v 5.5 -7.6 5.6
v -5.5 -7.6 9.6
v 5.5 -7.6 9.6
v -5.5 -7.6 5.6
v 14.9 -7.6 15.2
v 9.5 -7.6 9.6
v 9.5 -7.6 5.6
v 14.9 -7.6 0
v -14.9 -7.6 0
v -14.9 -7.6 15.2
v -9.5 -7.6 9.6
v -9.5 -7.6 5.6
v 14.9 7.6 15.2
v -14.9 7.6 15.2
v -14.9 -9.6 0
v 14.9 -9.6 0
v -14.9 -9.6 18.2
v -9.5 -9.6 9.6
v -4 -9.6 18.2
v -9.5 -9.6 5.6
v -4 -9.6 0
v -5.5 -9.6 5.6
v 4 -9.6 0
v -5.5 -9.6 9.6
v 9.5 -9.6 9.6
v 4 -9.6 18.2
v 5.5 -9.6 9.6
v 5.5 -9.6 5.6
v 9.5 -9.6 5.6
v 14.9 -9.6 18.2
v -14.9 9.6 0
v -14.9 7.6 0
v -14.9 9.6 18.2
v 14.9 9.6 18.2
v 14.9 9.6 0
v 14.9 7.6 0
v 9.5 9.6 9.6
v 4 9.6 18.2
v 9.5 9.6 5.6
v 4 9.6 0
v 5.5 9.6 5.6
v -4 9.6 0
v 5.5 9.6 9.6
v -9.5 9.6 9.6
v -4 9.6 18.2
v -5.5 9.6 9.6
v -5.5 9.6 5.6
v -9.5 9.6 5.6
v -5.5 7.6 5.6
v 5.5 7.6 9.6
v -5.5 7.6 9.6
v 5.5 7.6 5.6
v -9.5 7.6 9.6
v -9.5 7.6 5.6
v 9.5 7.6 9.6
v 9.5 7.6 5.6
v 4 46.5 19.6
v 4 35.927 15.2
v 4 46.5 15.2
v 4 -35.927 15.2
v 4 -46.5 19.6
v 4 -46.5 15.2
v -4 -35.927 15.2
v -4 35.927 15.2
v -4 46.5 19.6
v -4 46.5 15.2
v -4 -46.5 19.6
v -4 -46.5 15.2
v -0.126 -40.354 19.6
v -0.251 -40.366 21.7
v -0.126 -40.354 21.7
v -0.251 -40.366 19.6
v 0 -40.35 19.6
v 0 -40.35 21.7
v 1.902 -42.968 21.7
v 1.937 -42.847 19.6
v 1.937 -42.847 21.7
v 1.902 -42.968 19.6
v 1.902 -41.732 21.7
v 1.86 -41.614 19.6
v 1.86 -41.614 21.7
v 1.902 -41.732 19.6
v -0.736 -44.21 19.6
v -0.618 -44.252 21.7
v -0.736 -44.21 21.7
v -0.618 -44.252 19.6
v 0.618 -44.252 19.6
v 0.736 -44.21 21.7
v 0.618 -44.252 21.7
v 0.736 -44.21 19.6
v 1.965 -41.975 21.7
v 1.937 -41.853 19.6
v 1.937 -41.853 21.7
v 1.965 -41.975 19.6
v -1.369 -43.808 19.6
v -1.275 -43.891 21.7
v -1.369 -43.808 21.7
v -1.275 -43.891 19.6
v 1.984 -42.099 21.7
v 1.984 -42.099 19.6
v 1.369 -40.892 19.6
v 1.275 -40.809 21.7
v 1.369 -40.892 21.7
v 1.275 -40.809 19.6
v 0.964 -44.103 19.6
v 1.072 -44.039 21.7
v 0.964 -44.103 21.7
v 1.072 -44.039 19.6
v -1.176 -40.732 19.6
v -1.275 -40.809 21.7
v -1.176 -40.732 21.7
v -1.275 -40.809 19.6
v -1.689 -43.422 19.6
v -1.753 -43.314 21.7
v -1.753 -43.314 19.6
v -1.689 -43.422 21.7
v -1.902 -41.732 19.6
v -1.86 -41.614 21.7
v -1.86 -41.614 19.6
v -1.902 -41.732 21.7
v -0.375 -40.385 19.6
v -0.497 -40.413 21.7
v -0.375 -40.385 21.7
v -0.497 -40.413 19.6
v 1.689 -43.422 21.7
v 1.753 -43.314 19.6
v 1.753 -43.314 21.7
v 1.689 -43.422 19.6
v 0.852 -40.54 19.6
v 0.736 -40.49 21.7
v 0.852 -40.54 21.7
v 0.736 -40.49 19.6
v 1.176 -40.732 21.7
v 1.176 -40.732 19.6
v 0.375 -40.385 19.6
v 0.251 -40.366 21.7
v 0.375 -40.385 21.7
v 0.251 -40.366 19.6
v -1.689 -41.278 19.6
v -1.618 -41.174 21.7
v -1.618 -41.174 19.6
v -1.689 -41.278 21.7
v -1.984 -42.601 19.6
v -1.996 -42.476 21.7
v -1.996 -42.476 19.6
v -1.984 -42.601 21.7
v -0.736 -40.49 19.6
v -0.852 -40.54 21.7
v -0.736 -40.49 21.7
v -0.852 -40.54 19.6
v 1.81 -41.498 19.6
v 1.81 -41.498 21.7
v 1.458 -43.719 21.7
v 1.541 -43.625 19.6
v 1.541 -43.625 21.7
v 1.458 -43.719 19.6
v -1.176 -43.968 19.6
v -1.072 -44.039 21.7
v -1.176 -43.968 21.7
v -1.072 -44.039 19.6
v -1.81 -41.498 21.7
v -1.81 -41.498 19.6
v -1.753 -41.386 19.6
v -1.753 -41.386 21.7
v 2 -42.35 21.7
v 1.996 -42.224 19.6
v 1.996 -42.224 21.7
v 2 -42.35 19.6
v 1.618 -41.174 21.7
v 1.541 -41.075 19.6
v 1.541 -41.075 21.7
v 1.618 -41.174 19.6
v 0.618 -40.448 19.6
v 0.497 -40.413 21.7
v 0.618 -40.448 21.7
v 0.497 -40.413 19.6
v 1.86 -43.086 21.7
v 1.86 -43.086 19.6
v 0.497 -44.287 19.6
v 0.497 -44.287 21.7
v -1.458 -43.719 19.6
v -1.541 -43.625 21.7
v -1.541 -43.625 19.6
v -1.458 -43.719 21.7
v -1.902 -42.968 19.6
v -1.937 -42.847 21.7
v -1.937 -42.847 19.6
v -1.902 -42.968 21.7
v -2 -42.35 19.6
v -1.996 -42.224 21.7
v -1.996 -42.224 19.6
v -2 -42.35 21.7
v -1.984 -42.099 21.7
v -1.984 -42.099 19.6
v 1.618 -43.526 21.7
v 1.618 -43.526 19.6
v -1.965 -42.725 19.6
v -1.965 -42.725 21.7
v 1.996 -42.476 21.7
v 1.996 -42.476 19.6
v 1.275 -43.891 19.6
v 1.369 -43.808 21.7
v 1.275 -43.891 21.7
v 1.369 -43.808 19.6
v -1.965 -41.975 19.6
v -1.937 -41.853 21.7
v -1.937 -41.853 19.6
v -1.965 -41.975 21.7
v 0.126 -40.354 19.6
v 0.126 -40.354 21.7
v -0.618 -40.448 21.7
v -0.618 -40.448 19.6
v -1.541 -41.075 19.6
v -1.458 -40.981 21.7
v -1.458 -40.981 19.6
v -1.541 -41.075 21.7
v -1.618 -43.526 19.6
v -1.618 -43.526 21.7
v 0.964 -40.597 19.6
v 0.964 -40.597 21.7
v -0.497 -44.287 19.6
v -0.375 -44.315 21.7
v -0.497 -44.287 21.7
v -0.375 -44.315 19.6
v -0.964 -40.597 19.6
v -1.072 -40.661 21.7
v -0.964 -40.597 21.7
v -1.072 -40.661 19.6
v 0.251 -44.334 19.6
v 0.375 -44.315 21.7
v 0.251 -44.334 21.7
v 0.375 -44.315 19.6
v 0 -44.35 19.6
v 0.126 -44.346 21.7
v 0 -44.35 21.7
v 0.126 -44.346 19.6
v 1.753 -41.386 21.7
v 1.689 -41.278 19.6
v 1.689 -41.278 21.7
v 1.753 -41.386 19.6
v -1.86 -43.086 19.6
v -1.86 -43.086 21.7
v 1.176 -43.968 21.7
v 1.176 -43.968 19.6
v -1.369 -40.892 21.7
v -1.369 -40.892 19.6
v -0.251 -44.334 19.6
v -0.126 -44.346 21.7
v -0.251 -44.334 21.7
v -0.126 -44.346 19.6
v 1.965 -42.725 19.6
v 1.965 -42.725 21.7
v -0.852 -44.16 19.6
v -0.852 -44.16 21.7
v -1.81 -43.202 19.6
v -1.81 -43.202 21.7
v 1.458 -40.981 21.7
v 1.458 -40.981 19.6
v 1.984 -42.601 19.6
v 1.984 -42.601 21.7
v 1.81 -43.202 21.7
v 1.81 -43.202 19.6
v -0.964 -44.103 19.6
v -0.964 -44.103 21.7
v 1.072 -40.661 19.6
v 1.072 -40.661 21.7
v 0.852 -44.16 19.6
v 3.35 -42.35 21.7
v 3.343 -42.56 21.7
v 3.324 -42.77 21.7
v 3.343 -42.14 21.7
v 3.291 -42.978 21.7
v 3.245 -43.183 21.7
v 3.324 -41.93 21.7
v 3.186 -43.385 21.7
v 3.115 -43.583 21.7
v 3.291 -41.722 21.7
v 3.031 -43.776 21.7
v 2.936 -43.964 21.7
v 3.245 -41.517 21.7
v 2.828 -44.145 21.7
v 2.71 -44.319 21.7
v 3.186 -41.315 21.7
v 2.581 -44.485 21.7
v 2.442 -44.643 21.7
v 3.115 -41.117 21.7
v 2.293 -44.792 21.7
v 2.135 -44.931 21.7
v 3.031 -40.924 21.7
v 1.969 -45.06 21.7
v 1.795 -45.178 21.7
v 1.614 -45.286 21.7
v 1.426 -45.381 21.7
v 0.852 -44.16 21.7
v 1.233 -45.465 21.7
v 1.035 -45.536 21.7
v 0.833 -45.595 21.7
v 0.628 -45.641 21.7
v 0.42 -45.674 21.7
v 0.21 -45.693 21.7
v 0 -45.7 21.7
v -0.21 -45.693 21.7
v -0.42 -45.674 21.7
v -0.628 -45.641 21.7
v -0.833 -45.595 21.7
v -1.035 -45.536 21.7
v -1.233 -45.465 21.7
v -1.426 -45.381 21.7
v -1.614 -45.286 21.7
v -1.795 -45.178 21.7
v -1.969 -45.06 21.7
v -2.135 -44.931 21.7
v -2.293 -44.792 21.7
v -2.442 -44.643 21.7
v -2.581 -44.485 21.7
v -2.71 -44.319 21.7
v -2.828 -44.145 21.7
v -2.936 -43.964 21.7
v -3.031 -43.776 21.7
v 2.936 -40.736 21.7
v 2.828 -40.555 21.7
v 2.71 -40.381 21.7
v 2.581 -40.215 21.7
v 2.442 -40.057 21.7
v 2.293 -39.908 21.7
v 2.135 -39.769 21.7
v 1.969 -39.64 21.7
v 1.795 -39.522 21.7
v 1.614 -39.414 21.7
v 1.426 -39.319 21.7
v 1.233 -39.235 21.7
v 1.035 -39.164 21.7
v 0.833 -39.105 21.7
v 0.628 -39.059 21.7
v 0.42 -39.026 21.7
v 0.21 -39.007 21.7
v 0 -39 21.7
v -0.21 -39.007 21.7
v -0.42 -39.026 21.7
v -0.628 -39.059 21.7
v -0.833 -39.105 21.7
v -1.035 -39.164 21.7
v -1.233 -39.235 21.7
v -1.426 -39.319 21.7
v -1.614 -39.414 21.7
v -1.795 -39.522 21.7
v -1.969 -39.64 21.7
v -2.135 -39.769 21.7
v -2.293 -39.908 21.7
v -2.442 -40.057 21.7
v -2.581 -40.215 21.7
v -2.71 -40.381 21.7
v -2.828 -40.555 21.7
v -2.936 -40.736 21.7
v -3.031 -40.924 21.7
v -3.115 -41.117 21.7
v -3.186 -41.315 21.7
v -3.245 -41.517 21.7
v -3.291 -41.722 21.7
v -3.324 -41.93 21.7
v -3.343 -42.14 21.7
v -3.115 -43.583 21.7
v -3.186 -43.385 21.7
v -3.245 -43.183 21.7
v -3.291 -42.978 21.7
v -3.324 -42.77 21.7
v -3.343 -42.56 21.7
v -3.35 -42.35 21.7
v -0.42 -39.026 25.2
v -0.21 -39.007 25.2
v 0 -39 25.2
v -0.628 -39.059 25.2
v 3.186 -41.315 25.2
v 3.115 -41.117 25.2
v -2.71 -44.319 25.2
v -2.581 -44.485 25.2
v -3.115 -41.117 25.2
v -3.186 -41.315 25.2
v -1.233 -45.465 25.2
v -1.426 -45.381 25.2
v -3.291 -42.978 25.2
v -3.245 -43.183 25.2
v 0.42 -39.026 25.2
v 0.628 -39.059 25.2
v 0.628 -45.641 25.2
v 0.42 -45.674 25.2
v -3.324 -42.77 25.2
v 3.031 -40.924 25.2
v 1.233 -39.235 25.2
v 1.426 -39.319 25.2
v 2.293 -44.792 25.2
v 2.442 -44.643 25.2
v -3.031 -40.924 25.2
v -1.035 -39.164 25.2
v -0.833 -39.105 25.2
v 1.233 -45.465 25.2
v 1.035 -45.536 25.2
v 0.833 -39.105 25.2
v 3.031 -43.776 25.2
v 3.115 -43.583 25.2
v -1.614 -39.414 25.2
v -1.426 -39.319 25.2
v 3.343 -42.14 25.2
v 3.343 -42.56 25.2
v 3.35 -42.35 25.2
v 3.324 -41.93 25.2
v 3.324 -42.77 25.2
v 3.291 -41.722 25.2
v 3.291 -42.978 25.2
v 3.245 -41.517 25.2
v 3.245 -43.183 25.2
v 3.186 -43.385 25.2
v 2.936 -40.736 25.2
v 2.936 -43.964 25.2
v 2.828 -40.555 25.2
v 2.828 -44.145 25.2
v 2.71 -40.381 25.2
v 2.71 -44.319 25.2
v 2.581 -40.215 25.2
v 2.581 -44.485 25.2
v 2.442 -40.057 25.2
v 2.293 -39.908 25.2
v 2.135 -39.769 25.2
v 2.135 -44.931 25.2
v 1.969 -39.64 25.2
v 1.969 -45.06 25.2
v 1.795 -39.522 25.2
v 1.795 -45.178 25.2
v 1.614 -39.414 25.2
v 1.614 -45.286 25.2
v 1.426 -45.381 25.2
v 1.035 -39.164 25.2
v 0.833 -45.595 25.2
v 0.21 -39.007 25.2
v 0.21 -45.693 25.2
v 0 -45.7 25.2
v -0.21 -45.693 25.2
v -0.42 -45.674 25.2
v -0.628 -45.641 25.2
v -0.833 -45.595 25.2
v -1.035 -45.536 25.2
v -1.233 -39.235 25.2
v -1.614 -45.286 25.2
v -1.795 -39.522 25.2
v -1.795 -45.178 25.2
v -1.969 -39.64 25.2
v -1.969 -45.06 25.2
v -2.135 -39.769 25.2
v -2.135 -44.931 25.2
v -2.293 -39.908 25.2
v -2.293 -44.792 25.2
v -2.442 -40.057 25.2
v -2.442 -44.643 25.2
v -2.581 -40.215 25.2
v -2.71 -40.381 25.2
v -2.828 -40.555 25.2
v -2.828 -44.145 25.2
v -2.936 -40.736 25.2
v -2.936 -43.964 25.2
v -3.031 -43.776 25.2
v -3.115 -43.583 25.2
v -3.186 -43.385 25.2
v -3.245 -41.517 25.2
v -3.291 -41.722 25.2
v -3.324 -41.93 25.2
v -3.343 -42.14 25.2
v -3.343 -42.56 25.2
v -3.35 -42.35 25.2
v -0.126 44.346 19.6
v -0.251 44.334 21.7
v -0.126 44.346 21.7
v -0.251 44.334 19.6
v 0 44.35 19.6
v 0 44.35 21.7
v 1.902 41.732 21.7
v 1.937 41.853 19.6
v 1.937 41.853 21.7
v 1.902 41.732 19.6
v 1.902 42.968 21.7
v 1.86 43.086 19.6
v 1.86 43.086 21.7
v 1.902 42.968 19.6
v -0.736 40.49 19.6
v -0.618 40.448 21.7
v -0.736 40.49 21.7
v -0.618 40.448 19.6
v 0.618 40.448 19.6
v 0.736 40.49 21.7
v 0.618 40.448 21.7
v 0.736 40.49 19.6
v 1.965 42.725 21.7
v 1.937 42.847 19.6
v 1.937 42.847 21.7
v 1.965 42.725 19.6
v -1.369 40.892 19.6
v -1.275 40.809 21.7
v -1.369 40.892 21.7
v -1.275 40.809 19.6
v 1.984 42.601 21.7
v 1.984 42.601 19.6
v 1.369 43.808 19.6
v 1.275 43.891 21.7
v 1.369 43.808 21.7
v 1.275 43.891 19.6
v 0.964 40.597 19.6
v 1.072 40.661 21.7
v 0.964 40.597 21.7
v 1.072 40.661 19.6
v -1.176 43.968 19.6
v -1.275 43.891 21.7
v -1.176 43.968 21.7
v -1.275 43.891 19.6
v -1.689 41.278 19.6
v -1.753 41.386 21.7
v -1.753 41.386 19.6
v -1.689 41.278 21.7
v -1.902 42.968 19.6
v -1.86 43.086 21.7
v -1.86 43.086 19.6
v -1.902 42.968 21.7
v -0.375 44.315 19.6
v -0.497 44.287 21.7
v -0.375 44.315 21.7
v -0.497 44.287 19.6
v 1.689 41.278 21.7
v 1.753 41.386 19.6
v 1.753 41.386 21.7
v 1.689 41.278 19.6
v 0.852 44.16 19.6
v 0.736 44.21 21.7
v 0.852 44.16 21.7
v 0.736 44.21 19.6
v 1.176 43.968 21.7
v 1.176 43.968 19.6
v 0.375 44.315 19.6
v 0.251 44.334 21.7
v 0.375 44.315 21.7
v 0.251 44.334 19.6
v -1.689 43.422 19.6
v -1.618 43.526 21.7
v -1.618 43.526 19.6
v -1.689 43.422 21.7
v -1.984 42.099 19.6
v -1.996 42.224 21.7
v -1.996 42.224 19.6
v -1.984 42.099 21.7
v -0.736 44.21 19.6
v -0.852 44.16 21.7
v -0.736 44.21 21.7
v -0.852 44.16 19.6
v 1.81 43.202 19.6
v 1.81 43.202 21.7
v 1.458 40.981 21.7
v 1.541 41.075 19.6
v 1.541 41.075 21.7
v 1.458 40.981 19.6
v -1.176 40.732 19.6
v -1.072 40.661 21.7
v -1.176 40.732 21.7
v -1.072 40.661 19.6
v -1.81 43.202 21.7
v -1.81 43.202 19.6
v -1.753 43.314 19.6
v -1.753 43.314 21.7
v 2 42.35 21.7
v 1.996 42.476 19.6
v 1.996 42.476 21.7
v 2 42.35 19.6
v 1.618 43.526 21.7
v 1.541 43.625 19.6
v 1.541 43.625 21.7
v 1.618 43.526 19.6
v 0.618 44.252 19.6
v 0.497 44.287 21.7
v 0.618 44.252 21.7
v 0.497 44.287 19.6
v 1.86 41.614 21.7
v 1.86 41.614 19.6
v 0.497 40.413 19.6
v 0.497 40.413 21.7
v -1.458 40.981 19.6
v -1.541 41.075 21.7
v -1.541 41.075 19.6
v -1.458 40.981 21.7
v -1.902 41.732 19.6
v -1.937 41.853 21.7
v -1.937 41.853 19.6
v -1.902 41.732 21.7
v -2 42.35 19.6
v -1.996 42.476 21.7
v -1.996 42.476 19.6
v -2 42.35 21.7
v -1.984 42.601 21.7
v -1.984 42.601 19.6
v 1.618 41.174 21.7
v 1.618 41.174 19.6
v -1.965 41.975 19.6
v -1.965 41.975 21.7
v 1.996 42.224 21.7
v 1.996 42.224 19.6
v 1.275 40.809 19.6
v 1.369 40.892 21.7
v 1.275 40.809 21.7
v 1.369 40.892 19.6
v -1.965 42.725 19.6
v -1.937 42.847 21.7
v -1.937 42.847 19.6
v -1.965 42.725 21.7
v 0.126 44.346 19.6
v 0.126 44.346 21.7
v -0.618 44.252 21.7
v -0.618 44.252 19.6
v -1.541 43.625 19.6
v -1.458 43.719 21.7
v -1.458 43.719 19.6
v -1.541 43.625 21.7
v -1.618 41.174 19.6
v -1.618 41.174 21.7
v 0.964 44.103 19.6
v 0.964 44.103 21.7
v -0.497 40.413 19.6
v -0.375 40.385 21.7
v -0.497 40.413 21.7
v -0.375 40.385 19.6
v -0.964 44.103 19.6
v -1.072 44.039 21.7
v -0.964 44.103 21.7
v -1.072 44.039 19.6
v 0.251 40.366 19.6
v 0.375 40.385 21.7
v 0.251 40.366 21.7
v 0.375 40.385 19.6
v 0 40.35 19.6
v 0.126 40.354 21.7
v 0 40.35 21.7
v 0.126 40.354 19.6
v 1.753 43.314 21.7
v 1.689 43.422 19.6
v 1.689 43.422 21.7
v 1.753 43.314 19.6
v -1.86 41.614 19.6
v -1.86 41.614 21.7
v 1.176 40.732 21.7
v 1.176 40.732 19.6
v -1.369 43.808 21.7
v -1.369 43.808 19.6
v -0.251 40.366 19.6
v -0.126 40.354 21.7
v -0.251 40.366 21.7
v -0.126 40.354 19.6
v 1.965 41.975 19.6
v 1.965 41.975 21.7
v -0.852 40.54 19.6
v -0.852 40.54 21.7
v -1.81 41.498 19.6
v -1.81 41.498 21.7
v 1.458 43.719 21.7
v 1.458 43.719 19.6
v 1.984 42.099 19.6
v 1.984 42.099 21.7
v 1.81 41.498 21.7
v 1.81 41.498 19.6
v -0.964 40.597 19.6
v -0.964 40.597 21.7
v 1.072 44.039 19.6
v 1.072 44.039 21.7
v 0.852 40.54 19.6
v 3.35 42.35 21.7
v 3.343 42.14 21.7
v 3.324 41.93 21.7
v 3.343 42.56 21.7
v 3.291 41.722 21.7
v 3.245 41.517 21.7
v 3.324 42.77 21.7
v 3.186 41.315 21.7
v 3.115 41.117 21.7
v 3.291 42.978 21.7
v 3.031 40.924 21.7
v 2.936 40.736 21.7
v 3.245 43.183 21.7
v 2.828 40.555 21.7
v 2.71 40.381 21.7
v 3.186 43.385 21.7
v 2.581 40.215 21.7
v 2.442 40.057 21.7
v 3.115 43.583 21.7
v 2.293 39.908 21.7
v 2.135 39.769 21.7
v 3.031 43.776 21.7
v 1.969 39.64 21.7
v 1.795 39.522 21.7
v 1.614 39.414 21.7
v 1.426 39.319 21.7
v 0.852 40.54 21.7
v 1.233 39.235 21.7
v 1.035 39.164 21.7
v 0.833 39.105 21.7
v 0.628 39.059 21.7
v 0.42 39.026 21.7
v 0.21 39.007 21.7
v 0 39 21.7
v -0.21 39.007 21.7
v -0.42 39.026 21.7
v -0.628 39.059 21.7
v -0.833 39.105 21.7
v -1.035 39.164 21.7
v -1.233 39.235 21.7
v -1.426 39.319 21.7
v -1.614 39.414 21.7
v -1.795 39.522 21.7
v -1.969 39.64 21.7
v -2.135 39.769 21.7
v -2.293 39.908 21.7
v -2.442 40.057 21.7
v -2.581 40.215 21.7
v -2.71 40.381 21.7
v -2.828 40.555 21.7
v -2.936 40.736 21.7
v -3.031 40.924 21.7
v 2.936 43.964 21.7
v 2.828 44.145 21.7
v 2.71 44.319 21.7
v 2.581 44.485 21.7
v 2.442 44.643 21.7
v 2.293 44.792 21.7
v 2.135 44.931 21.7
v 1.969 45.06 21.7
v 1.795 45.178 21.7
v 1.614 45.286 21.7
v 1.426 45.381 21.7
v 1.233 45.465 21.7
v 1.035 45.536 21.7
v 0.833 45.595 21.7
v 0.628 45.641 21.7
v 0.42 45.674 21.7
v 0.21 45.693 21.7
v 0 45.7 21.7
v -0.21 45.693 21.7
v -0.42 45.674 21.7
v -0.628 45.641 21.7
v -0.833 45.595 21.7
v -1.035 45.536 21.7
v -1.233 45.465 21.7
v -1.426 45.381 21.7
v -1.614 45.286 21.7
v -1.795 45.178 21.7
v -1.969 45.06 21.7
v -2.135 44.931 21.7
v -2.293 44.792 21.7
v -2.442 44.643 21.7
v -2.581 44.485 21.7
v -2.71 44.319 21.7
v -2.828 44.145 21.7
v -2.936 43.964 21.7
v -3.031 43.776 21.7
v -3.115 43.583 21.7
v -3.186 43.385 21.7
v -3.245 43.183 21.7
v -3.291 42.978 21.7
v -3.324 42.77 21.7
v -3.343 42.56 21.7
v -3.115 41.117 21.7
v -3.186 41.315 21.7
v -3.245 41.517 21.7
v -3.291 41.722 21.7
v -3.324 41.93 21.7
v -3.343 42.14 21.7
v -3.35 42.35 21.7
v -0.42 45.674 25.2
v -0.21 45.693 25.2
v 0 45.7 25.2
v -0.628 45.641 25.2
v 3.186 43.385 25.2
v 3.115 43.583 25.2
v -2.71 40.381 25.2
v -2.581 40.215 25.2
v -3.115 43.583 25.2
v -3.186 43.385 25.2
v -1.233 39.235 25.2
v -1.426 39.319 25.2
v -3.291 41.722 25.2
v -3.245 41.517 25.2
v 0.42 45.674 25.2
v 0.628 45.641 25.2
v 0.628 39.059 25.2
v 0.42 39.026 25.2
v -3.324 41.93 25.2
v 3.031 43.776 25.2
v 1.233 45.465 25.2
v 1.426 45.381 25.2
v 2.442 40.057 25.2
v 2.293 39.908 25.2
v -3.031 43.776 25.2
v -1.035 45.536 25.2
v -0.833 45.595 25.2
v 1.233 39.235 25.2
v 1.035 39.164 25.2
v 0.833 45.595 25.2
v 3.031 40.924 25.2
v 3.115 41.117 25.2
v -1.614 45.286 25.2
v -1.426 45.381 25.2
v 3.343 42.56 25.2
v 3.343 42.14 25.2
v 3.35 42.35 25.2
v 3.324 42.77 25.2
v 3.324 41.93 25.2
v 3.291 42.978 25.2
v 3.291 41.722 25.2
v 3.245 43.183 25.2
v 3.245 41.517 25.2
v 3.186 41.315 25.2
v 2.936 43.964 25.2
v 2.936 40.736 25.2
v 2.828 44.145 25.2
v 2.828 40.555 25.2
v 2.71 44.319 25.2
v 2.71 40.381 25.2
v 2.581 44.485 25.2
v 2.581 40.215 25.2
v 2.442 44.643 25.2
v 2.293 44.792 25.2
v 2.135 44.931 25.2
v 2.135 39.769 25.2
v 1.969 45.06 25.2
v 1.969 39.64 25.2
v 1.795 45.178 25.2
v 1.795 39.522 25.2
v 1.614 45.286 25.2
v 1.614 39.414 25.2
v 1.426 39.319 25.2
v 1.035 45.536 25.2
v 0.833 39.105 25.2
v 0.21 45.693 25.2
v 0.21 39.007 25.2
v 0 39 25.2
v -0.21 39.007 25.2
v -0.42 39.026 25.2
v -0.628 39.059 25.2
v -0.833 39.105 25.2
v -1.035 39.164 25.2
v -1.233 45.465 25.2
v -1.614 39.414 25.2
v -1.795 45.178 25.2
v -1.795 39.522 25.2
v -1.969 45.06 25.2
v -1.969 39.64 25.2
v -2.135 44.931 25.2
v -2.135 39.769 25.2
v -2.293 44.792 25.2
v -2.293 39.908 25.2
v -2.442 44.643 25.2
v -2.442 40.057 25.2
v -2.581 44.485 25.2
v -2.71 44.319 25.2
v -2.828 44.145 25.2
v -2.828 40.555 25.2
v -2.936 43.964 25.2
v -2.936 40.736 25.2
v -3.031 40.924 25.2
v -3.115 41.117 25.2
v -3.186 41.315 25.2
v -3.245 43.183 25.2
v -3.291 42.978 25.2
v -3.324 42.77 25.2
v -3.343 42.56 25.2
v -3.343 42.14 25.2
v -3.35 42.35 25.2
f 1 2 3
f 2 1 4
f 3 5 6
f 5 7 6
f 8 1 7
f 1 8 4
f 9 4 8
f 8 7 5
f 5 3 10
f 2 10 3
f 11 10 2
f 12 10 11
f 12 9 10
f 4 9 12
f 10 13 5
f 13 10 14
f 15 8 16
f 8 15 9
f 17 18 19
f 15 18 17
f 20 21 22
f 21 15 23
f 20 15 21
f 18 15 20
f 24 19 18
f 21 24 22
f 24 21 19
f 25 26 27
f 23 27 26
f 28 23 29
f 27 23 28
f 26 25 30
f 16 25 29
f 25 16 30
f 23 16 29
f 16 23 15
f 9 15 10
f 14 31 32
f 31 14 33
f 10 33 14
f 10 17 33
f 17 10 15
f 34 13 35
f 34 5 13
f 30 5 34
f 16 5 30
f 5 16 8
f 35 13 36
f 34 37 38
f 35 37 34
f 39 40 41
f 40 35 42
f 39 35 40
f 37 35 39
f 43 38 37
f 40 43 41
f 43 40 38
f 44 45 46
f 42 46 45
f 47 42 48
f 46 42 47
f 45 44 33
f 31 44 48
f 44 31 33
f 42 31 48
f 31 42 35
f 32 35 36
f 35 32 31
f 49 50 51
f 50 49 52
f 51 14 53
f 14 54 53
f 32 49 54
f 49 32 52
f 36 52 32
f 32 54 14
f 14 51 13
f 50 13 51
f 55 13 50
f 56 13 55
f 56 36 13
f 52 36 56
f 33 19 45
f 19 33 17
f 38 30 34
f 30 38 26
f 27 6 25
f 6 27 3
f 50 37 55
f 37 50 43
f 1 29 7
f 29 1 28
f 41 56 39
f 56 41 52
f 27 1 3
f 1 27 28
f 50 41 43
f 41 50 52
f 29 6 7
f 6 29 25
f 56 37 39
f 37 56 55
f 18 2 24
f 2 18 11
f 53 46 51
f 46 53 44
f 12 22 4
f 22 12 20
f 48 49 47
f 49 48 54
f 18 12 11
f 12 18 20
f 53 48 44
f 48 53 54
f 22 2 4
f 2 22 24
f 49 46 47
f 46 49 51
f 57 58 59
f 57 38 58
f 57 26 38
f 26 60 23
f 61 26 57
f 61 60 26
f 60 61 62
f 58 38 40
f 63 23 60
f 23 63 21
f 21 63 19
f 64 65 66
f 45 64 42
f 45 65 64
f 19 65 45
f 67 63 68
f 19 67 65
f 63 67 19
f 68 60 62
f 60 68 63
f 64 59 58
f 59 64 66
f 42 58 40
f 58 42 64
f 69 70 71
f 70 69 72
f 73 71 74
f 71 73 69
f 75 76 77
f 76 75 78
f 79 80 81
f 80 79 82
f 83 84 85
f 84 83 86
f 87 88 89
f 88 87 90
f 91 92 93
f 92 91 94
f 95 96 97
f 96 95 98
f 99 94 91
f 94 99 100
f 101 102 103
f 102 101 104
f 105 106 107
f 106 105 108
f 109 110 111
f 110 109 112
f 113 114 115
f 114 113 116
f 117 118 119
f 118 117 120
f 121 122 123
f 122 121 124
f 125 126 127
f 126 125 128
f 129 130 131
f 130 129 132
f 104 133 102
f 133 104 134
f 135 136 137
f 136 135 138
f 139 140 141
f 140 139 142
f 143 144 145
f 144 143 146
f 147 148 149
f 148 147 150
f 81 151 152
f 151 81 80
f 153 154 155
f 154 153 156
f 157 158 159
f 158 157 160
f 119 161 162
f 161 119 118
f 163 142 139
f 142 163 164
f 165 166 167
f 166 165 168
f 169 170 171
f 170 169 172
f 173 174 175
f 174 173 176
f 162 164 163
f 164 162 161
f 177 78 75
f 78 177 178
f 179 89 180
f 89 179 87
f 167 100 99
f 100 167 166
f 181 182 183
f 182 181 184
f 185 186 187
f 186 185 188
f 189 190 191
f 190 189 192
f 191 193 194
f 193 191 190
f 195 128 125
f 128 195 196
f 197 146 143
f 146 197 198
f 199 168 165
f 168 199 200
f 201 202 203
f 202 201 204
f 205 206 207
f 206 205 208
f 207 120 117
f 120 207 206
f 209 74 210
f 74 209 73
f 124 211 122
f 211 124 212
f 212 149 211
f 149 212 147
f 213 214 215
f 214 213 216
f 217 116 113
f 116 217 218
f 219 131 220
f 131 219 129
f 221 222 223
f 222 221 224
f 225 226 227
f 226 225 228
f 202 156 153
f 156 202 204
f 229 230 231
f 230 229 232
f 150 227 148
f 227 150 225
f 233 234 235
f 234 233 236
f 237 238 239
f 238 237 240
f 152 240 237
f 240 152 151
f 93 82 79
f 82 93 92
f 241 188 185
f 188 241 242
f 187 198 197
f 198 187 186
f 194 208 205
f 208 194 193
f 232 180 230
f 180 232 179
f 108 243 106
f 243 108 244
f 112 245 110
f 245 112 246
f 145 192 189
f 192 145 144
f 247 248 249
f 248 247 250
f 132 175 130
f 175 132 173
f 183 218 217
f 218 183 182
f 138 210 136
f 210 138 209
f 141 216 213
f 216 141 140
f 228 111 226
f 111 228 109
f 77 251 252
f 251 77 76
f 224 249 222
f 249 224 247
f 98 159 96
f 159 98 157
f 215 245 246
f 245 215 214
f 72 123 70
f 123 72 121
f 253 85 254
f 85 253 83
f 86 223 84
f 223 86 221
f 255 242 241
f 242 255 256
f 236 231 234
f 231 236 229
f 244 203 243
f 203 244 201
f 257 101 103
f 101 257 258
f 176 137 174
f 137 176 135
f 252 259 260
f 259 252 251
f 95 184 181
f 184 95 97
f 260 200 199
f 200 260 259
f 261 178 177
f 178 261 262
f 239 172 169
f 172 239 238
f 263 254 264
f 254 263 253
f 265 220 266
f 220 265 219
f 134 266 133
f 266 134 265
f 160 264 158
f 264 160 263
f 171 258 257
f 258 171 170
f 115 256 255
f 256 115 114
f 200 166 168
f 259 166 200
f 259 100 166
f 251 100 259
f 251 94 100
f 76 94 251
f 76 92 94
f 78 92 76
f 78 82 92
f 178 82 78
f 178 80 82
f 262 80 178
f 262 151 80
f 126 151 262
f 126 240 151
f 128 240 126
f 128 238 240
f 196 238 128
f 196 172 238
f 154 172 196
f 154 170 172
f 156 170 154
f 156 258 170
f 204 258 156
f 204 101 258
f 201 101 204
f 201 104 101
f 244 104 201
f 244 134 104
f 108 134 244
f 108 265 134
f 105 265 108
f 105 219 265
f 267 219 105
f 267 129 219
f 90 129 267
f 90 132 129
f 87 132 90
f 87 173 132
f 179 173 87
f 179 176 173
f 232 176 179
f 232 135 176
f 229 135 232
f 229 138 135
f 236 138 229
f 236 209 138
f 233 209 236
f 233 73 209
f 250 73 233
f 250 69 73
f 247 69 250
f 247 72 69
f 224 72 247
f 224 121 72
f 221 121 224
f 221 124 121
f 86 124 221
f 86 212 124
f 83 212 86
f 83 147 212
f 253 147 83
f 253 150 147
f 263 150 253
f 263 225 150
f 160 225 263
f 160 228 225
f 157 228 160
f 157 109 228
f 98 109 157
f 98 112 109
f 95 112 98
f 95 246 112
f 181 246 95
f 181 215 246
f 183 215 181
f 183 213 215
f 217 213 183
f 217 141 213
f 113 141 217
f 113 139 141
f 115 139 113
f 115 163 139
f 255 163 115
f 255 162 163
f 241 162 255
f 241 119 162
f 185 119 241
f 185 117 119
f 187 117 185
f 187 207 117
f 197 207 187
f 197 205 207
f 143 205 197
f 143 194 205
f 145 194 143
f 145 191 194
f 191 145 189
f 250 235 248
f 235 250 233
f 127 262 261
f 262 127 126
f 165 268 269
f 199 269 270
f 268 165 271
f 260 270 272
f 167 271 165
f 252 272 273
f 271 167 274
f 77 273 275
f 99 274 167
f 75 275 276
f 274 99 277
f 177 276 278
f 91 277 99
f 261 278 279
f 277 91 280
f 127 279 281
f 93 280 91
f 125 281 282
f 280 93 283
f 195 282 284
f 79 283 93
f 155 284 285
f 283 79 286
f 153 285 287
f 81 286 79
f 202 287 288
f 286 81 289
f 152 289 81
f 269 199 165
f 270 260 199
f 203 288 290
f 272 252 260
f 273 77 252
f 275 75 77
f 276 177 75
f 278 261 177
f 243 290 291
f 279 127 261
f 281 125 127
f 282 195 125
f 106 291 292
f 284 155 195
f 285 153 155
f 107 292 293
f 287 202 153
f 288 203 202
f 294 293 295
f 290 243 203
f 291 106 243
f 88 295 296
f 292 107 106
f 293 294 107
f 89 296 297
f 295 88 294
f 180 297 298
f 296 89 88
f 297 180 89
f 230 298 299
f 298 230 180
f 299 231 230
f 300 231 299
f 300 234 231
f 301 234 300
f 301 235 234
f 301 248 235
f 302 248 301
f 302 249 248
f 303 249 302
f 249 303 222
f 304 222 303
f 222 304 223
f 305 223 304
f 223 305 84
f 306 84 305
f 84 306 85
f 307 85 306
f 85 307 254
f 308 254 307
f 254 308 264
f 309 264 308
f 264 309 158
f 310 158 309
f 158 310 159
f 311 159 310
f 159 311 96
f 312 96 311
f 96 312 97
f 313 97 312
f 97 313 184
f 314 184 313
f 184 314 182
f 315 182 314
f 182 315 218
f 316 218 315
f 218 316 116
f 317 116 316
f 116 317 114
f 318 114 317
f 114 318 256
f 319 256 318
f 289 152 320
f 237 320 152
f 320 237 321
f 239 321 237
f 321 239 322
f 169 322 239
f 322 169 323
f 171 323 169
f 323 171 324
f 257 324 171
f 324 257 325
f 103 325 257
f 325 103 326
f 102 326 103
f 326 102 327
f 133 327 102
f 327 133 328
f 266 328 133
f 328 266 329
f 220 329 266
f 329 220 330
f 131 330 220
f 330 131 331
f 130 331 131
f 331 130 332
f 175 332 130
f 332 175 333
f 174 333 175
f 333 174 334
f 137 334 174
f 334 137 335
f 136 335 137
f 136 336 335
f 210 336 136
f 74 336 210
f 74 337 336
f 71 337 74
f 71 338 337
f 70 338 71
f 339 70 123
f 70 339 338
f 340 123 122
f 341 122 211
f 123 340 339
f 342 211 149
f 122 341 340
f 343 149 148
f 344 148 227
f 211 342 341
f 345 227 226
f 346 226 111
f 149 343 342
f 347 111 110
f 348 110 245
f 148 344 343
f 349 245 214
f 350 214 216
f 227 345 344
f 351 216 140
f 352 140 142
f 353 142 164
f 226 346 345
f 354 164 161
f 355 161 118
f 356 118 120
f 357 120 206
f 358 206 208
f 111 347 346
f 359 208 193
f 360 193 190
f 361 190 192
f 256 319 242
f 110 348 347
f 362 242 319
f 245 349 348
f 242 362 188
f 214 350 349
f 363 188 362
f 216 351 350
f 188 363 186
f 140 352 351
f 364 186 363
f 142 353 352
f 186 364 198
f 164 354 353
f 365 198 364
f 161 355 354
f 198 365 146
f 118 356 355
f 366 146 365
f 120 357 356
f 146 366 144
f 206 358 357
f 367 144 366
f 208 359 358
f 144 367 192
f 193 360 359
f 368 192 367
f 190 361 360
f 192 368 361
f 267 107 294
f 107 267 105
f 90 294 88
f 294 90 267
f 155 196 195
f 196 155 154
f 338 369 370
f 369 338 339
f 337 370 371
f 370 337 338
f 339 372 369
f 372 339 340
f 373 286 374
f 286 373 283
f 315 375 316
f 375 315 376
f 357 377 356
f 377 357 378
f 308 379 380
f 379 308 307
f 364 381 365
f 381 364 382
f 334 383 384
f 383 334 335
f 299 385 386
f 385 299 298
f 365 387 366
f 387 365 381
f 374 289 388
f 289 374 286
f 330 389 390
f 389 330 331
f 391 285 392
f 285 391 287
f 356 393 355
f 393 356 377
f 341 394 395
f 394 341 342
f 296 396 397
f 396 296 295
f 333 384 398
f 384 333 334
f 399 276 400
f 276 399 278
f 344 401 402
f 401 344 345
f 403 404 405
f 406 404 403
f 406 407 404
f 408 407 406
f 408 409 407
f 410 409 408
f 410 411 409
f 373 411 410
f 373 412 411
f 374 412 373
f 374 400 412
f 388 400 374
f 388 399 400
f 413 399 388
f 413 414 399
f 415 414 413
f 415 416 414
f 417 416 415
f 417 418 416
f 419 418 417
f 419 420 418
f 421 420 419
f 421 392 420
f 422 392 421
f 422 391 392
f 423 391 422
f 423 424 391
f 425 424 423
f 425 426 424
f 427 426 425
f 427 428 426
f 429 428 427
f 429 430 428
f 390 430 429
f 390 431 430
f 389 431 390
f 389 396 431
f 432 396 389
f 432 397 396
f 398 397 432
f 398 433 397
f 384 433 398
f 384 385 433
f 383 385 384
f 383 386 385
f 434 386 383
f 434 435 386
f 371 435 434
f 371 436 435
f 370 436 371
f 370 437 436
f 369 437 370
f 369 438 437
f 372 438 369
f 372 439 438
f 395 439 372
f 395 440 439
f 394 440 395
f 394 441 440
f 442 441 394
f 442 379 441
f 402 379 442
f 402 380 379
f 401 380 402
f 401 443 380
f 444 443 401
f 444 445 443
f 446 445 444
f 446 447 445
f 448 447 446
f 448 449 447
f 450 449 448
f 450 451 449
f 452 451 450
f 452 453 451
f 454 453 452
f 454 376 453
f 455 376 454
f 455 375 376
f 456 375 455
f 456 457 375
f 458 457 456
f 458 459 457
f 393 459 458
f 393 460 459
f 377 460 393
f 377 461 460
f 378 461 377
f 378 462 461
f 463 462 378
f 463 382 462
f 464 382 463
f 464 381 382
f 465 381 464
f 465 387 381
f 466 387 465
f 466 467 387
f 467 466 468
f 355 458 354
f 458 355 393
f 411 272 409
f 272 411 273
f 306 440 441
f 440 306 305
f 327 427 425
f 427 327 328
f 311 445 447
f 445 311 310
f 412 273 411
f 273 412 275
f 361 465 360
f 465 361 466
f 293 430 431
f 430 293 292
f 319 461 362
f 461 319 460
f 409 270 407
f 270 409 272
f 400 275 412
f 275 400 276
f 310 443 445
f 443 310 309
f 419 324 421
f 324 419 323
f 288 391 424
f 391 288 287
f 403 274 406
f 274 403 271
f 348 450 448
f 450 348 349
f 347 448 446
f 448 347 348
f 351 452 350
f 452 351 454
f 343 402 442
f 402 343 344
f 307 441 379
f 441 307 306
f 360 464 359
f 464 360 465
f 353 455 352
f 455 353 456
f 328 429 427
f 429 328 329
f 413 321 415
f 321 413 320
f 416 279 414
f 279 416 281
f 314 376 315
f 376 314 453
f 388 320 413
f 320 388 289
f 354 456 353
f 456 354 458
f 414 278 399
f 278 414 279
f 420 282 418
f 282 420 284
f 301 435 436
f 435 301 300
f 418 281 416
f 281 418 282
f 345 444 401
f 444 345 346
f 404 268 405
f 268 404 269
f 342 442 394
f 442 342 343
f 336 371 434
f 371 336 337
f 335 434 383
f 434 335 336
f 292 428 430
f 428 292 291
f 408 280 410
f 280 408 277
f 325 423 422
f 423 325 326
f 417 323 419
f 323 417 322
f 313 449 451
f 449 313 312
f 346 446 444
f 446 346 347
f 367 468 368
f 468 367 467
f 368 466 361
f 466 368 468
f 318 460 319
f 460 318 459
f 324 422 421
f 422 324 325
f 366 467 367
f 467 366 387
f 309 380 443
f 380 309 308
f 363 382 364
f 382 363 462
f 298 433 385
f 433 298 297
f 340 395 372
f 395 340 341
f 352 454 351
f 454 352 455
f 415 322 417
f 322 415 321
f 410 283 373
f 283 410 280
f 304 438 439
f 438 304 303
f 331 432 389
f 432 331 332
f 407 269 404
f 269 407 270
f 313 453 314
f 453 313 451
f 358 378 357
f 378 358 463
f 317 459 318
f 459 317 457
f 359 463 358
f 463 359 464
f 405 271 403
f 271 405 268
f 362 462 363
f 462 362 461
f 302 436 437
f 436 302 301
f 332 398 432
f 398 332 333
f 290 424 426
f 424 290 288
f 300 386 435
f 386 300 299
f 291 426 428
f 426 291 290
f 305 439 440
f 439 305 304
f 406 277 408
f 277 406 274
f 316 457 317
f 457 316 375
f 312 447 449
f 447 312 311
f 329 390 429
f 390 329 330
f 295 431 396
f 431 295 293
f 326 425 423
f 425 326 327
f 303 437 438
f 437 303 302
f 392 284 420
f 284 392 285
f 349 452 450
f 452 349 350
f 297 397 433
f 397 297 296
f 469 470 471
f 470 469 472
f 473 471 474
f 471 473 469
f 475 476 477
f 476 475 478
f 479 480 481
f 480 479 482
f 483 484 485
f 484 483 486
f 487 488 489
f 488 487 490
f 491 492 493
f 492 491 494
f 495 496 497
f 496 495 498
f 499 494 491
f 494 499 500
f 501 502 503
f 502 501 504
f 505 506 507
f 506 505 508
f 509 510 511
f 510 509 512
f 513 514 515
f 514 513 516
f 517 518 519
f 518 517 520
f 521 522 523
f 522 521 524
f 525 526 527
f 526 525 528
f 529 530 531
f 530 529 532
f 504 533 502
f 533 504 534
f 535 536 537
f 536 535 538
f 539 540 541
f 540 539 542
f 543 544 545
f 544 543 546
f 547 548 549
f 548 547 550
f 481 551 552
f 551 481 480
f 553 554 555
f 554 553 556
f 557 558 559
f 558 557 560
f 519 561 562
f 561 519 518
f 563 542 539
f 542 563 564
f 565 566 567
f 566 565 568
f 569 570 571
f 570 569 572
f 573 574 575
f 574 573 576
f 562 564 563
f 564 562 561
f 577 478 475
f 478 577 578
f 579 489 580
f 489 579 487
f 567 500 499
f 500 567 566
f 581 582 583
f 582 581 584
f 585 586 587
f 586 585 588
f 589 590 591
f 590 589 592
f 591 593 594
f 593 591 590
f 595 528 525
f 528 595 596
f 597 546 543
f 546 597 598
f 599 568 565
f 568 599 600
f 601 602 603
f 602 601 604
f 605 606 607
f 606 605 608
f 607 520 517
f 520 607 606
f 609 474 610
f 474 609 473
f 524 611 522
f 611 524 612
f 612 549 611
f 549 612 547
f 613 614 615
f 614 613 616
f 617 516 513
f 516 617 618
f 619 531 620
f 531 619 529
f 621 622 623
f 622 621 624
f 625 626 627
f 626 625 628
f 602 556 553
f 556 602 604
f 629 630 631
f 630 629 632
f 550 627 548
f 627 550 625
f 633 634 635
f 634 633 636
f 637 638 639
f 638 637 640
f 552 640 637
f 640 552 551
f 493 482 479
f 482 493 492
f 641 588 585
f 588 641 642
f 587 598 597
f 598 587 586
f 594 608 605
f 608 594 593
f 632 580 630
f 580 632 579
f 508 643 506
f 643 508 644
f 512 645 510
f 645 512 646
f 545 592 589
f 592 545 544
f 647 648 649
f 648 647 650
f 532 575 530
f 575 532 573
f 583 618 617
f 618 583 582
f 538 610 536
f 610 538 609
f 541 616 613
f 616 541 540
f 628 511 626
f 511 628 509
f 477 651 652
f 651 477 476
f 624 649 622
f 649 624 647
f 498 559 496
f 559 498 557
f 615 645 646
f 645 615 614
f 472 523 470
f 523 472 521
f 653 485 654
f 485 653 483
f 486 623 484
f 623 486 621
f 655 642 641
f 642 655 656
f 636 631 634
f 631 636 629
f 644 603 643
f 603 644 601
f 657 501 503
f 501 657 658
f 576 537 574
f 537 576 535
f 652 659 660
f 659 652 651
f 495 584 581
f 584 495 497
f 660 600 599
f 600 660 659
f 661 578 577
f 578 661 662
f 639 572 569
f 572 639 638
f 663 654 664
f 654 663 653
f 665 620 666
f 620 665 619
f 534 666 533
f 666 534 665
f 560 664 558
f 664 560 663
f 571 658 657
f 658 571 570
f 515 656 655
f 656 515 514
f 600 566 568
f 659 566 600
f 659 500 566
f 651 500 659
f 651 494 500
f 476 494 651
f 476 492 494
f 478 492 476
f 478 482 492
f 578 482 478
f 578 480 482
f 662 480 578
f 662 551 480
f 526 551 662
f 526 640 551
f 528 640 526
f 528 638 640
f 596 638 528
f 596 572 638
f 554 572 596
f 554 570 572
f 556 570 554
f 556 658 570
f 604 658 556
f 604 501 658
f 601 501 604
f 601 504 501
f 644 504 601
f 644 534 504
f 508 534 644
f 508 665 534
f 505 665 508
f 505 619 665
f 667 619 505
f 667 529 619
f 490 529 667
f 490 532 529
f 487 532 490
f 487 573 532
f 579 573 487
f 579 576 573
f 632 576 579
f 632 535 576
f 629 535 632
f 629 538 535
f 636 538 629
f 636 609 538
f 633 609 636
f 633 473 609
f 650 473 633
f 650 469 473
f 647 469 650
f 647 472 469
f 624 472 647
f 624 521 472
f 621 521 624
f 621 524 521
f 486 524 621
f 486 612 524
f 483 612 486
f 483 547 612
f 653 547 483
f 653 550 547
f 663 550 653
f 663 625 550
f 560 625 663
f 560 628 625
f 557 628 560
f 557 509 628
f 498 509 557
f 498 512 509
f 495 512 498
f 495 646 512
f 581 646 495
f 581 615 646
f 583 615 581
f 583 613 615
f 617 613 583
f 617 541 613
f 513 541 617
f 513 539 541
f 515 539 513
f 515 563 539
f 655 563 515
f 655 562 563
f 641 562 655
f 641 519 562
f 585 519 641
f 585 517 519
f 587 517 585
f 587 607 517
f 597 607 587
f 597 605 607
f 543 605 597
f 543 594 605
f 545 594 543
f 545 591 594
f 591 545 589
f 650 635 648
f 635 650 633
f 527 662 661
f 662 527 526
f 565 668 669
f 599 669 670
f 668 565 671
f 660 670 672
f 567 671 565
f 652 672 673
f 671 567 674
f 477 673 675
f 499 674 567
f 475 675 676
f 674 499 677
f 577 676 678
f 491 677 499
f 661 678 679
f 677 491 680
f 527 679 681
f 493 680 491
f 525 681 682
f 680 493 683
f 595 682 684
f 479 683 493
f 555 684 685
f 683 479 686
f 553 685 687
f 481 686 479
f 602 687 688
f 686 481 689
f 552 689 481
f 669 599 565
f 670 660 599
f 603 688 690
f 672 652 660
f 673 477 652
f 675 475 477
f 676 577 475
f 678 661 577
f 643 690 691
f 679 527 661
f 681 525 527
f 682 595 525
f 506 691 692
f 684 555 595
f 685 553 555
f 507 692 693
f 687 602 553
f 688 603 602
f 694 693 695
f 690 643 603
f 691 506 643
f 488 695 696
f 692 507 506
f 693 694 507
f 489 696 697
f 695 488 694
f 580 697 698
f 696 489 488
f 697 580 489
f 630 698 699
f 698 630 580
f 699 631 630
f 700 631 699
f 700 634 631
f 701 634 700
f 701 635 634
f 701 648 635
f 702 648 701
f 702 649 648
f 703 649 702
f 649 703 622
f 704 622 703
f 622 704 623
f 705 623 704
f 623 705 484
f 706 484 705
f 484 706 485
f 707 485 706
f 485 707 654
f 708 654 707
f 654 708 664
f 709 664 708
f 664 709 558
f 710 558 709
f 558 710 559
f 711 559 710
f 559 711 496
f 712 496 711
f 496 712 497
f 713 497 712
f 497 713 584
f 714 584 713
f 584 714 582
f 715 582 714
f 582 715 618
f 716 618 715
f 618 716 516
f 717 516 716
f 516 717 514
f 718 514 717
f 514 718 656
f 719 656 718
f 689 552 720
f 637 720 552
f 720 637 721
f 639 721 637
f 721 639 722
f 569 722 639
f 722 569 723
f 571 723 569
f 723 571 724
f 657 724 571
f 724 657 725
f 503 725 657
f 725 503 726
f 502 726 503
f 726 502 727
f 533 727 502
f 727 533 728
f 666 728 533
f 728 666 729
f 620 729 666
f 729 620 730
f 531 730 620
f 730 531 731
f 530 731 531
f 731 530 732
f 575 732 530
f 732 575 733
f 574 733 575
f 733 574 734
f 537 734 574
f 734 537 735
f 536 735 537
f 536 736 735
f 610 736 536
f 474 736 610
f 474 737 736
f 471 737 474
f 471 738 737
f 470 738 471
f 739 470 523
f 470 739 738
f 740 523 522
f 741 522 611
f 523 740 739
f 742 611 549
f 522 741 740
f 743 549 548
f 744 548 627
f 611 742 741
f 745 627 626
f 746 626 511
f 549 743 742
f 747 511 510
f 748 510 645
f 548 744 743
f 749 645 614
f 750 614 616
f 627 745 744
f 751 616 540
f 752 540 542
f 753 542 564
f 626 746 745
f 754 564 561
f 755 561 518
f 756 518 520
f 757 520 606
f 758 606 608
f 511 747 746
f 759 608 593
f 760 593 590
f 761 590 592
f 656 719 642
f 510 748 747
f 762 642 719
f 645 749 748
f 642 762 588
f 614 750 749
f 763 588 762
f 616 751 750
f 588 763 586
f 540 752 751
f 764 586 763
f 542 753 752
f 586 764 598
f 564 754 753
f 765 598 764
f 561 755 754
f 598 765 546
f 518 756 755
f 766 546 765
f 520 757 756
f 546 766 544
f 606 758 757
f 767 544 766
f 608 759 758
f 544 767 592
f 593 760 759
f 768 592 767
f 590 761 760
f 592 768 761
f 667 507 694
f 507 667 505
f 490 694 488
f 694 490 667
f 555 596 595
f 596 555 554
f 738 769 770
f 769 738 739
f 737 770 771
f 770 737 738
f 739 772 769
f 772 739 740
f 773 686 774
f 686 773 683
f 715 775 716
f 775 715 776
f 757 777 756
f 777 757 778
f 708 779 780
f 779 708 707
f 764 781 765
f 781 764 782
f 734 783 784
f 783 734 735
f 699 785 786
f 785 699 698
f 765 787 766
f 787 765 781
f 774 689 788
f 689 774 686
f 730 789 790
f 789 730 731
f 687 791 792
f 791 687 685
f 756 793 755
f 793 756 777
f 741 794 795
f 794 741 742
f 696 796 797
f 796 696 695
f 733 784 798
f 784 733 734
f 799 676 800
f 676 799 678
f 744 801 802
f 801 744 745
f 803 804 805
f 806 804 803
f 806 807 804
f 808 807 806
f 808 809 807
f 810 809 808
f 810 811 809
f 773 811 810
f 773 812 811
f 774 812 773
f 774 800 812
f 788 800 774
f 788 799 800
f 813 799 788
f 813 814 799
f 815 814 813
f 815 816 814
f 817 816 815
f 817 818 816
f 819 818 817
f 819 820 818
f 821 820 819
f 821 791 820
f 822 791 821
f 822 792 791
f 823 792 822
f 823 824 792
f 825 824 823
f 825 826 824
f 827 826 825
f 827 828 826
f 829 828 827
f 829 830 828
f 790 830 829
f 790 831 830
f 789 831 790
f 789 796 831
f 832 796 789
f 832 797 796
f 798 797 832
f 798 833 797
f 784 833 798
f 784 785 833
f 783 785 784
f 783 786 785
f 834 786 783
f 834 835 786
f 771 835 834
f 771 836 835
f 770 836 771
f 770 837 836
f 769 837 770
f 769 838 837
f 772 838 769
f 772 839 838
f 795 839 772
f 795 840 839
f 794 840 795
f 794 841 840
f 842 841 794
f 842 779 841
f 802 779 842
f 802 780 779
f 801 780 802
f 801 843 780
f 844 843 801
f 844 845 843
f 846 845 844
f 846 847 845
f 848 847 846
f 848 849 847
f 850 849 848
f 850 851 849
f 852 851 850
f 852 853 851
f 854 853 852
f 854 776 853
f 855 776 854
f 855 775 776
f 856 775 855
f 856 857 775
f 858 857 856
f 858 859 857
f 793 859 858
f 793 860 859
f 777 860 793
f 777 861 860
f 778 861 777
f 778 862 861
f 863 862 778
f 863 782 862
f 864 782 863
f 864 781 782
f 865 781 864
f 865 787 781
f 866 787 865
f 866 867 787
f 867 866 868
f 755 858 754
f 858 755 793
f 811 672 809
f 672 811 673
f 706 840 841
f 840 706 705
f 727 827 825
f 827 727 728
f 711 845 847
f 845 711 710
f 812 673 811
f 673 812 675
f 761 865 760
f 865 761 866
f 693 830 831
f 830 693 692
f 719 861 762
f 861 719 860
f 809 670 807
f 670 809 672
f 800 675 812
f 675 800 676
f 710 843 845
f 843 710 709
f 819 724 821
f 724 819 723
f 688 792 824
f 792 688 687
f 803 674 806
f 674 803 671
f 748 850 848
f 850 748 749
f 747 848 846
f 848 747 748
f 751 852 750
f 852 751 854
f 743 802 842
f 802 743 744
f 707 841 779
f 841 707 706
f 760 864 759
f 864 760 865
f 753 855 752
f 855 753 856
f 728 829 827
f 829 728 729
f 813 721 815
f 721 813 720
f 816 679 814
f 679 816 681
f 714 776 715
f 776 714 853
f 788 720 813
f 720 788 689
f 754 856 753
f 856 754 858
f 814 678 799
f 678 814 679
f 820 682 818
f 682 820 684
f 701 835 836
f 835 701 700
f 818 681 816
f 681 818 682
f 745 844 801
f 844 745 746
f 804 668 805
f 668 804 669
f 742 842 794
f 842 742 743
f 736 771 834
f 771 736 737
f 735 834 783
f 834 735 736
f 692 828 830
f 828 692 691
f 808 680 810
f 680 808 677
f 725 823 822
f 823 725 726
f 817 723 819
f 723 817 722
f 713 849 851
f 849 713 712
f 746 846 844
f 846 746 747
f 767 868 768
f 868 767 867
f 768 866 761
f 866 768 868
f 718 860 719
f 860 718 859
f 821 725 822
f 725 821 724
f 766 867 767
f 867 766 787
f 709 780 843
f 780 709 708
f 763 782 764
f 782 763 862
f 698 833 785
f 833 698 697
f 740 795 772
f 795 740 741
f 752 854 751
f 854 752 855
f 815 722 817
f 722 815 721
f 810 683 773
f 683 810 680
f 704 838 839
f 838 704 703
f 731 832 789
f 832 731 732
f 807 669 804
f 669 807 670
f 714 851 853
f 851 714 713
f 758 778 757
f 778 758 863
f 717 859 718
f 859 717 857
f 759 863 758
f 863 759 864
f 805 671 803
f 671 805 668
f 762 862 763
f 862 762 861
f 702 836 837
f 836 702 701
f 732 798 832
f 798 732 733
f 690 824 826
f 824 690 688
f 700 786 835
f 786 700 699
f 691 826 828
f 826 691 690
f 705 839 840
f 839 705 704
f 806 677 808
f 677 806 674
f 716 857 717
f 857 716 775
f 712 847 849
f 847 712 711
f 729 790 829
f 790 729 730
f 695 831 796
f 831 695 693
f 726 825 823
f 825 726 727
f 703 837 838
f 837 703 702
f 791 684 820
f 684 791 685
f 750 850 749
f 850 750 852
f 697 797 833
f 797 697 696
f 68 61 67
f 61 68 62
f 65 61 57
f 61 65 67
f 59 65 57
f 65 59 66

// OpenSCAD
// Ruckus AP HomeRacker sleeve scaffold
//
// CC BY-SA 4.0

/* [HomeRacker Sleeve] */
part_mode = 3; // [0:Sleeve only,1:Reference STL only,2:Sleeve with reference overlay,3:Prototype mount,4:Prototype with reference overlay]
sleeve_units = 9; // [3:1:12]
sleeve_island_count = 1; // [1:One centered island,2:Two end islands]
sleeve_holes_per_island = 2; // [1:1:8]
sleeve_rotation = 90; // [0,90]
sleeve_wall = 2; // [1.2:0.1:4]
sleeve_roof_thickness = 3; // [1.6:0.1:6]
sleeve_tolerance = 0.2; // [0:0.05:0.6]
lockpin_holes_enabled = true; // [false,true]

/* [Reference] */
reference_alpha = 0.25; // [0:0.05:1]
reference_scale = 1; // [0.1:0.01:5]
reference_translate = [0, 0, 0];
reference_rotate = [0, 0, 0];

/* [Ruckus Interface] */
ruckus_base_length = 93; // [60:0.1:130]
ruckus_base_width = 24; // [12:0.1:50]
ruckus_base_thickness = 4.4; // [1:0.1:8]
ruckus_bridge_width = 8; // [4:0.1:20]
ruckus_raised_bridge_length = 32.25; // [10:0.1:80]
ruckus_raised_bridge_width = 6; // [3:0.1:20]
ruckus_raised_bridge_height = 0; // [0:0.1:6]
ruckus_prong_spacing = 84.7; // [50:0.1:110]
ruckus_prong_shaft_diameter = 4; // [2:0.1:8]
ruckus_prong_shaft_height = 2.1; // [1:0.1:8]
ruckus_prong_cap_diameter = 6.7; // [3:0.1:12]
ruckus_prong_cap_height = 3.5; // [1:0.1:8]
ruckus_interface_rotation = 90; // [0,90]
ruckus_mount_z = -3; // [-20:0.1:30]
ruckus_gussets_enabled = true; // [false,true]
ruckus_gusset_thickness = 8; // [1:0.1:20]
ruckus_gusset_overhang_angle = 30; // [10:0.1:60]

/* [Debug] */
debug_colors = false; // [false,true]

/* [Hidden] */
$fn = 100;
EPSILON = 0.01;

// HomeRacker-compatible dimensions, mirrored locally so the model also
// compiles when opened directly in the OpenSCAD GUI.
BASE_UNIT = 15;
BASE_STRENGTH = 2;
TOLERANCE = 0.2;
LOCKPIN_HOLE_SIDE_LENGTH = 4;
HR_YELLOW = "#f7b600";
REFERENCE_BLUE = "#4c78a8";
PRONG_GREEN = "#00a651";

LOCKPIN_SIDE = LOCKPIN_HOLE_SIDE_LENGTH;
SLEEVE_INNER_SIDE = BASE_UNIT + sleeve_tolerance;
SLEEVE_OUTER_WIDTH = BASE_UNIT + 2 * sleeve_wall + sleeve_tolerance;
SLEEVE_SEGMENT_LENGTH = sleeve_holes_per_island * BASE_UNIT - sleeve_tolerance;
SLEEVE_ROOF_SEGMENT_LENGTH = SLEEVE_SEGMENT_LENGTH;
SLEEVE_ROOF_WIDTH = SLEEVE_OUTER_WIDTH;
SLEEVE_SEGMENT_OFFSET = sleeve_island_count == 1 ? 0 : (sleeve_units - sleeve_holes_per_island) * BASE_UNIT / 2;
SLEEVE_LOCKPIN_CENTER_Z = BASE_UNIT / 2 + sleeve_tolerance / 2;
SLEEVE_ISLAND_SIDES = sleeve_island_count == 1 ? [0] : [-1, 1];
RUCKUS_INTERFACE_BASE_Z = SLEEVE_INNER_SIDE + sleeve_roof_thickness + ruckus_mount_z;
RUCKUS_GUSSET_INNER_X = SLEEVE_OUTER_WIDTH / 2;
RUCKUS_GUSSET_OUTER_X = min(
    ruckus_base_length / 2,
    RUCKUS_GUSSET_INNER_X + RUCKUS_INTERFACE_BASE_Z / tan(ruckus_gusset_overhang_angle)
);
REFERENCE_CENTER = [62.5, 40, 0];

module centered_box(size) {
    cube(size, center = true);
}

module lockpin_hole() {
    centered_box([SLEEVE_OUTER_WIDTH + EPSILON, LOCKPIN_SIDE, LOCKPIN_SIDE]);
}

module lockpin_holes() {
    if (lockpin_holes_enabled) {
        for (segment_side = SLEEVE_ISLAND_SIDES) {
            for (hole = [0 : 1 : sleeve_holes_per_island - 1]) {
                local_y = (hole - (sleeve_holes_per_island - 1) / 2) * BASE_UNIT;

                translate([0, segment_side * SLEEVE_SEGMENT_OFFSET + local_y, SLEEVE_LOCKPIN_CENTER_Z])
                    lockpin_hole();
            }
        }
    }
}

module sleeve_segment(segment_side) {
    segment_y = segment_side * SLEEVE_SEGMENT_OFFSET;

    union() {
        for (wall_side = [-1, 1]) {
            translate([
                wall_side * (SLEEVE_INNER_SIDE / 2 + sleeve_wall / 2),
                segment_y,
                SLEEVE_INNER_SIDE / 2
            ])
                centered_box([sleeve_wall, SLEEVE_SEGMENT_LENGTH, SLEEVE_INNER_SIDE]);
        }

        translate([0, segment_y, SLEEVE_INNER_SIDE + sleeve_roof_thickness / 2])
            centered_box([SLEEVE_ROOF_WIDTH, SLEEVE_ROOF_SEGMENT_LENGTH, sleeve_roof_thickness]);
    }
}

module homeracker_sleeve() {
    color(debug_colors ? HR_YELLOW : HR_YELLOW)
    rotate([0, 0, sleeve_rotation])
    difference() {
        union() {
            for (segment_side = SLEEVE_ISLAND_SIDES)
                sleeve_segment(segment_side);
        }

        lockpin_holes();
    }
}

module reference_mount() {
    color(REFERENCE_BLUE, reference_alpha)
    translate(reference_translate)
    rotate(reference_rotate)
    scale(reference_scale)
    translate(-REFERENCE_CENTER)
        import("../../../reference/Ruckus_Wall_Mount_-_Miniature_Experimental.stl", convexity = 10);
}

module ruckus_prong(center_x) {
    color(PRONG_GREEN)
    translate([center_x, 0, ruckus_base_thickness])
    union() {
        cylinder(d = ruckus_prong_shaft_diameter, h = ruckus_prong_shaft_height);
        translate([0, 0, ruckus_prong_shaft_height])
            cylinder(d = ruckus_prong_cap_diameter, h = ruckus_prong_cap_height);
    }
}

module ruckus_base_outline_2d() {
    square([ruckus_base_length, ruckus_bridge_width], center = true);
}

module ruckus_drop_gusset_positive() {
    x_inner = RUCKUS_GUSSET_INNER_X;
    x_outer = RUCKUS_GUSSET_OUTER_X;
    y0 = -ruckus_gusset_thickness / 2;
    y1 = ruckus_gusset_thickness / 2;
    z_bottom = -RUCKUS_INTERFACE_BASE_Z;

    color(debug_colors ? REFERENCE_BLUE : "#f5f5f0")
    polyhedron(
        points = [
            [x_inner, y0, z_bottom],
            [x_inner, y0, 0],
            [x_outer, y0, 0],
            [x_inner, y1, z_bottom],
            [x_inner, y1, 0],
            [x_outer, y1, 0]
        ],
        faces = [
            [0, 1, 2],
            [3, 5, 4],
            [0, 3, 4, 1],
            [1, 4, 5, 2],
            [2, 5, 3, 0]
        ]
    );
}

module ruckus_drop_gusset(side) {
    if (side < 0) {
        mirror([1, 0, 0])
            ruckus_drop_gusset_positive();
    } else {
        ruckus_drop_gusset_positive();
    }
}

module ruckus_drop_gussets() {
    if (ruckus_gussets_enabled) {
        for (side = [-1, 1])
            ruckus_drop_gusset(side);
    }
}

module ruckus_reference_approximation() {
    union() {
        color(debug_colors ? REFERENCE_BLUE : "#f5f5f0")
            linear_extrude(ruckus_base_thickness)
                ruckus_base_outline_2d();

        ruckus_drop_gussets();

        if (ruckus_raised_bridge_height > 0) {
            color(debug_colors ? REFERENCE_BLUE : "#f5f5f0")
            translate([0, 0, ruckus_base_thickness + ruckus_raised_bridge_height / 2])
                centered_box([ruckus_raised_bridge_length, ruckus_raised_bridge_width, ruckus_raised_bridge_height]);
        }

        for (side = [-1, 1])
            ruckus_prong(side * ruckus_prong_spacing / 2);
    }
}

module prototype_mount() {
    union() {
        homeracker_sleeve();

        translate([0, 0, SLEEVE_INNER_SIDE + sleeve_roof_thickness + ruckus_mount_z])
            rotate([0, 0, ruckus_interface_rotation])
                ruckus_reference_approximation();
    }
}

module model() {
    assert(sleeve_units > 0, "Sleeve units must be positive.");
    assert(sleeve_island_count == 1 || sleeve_island_count == 2, "Sleeve island count must be 1 or 2.");
    assert(sleeve_holes_per_island > 0, "At least one sleeve hole per island is required.");
    assert(sleeve_island_count == 1 || sleeve_holes_per_island * 2 <= sleeve_units, "Sleeve end segments overlap; reduce holes per island or increase sleeve units.");
    assert(sleeve_rotation == 0 || sleeve_rotation == 90, "Sleeve rotation must be 0 or 90 degrees.");
    assert(part_mode >= 0 && part_mode <= 4, "Part mode must be 0, 1, 2, 3, or 4.");
    assert(ruckus_interface_rotation == 0 || ruckus_interface_rotation == 90, "Ruckus interface rotation must be 0 or 90 degrees.");
    assert(ruckus_prong_shaft_diameter > 0, "Ruckus prong shaft diameter must be positive.");
    assert(ruckus_prong_shaft_height > 0, "Ruckus prong shaft height must be positive.");
    assert(ruckus_prong_cap_diameter >= ruckus_prong_shaft_diameter, "Ruckus prong cap must be at least as wide as the shaft.");
    assert(ruckus_prong_cap_height > 0, "Ruckus prong cap height must be positive.");
    assert(RUCKUS_INTERFACE_BASE_Z >= 0, "Ruckus interface base must stay at or above global z=0.");
    assert(ruckus_gusset_thickness > 0, "Ruckus gusset thickness must be positive.");
    assert(ruckus_gusset_overhang_angle > 0 && ruckus_gusset_overhang_angle < 90, "Ruckus gusset overhang angle must be between 0 and 90 degrees.");
    assert(RUCKUS_GUSSET_OUTER_X > RUCKUS_GUSSET_INNER_X, "Ruckus gusset leaves no horizontal span.");

    if (part_mode == 0) {
        homeracker_sleeve();
    } else if (part_mode == 1) {
        reference_mount();
    } else if (part_mode == 2) {
        homeracker_sleeve();
        translate([0, 0, SLEEVE_INNER_SIDE + sleeve_roof_thickness])
            rotate([0, 0, ruckus_interface_rotation])
                reference_mount();
    } else if (part_mode == 3) {
        prototype_mount();
    } else if (part_mode == 4) {
        prototype_mount();
        translate([0, 0, SLEEVE_INNER_SIDE + sleeve_roof_thickness])
            rotate([0, 0, ruckus_interface_rotation])
                reference_mount();
    }
}

model();
